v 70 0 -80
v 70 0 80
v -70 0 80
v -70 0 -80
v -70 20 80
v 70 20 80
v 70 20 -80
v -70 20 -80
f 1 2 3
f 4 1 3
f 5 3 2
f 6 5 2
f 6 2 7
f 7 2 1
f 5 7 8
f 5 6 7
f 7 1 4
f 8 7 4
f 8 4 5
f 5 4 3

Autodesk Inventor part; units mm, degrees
ref_plane "YZ Plane" through (0, 0, 0) normal (1, 0, 0) x (0, 1, 0)
ref_plane "XZ Plane" through (0, 0, 0) normal (0, 1, 0) x (-1, 0, 0)
ref_plane "XY Plane" through (0, 0, 0) normal (0, 0, 1) x (1, 0, 0)
sketch "Sketch1" plane through (0, 0, 0) normal (0, 1, 0) x (-1, 0, 0)
  line L0 (70, 80) -> (-70, 80)
  line L1 (-70, 80) -> (-70, -80)
  line L2 (-70, -80) -> (70, -80)
  line L3 (70, -80) -> (70, 80)
  point P0 (0, 0)
  dimension "d13" = 20
  dimension "d0" = 140
  dimension "d1" = 160
  dimension "d4" = 70
  dimension "d5" = 80
extrude "Extrusion1" add sketch "Sketch1" along normal blind 20
sketch "Sketch2" plane through (0, 20, 0) normal (0, 1, 0) x (1, 0, 0)
  line L0 (50, 60) -> (-50, 60)
  line L1 (-50, 60) -> (-50, -60)
  line L2 (-50, -60) -> (50, -60)
  line L3 (50, -60) -> (50, 60)
  line L4 (50, 60) -> (-50, -60) construction
  line L5 (-50, 60) -> (50, -60) construction
  point P0 (0, 0)
  dimension "d8" = 100
  dimension "d9" = 120
extrude "Extrusion2" add sketch "Sketch2" along normal blind 10
sketch "Sketch3" plane through (0, 30, 0) normal (0, 1, 0) x (1, 0, 0)
  line L0 (-50, 60) -> (-50, -60) projected
  line L1 (-50, -60) -> (-30, -60)
  line L2 (-30, -60) -> (-30, -40)
  line L3 (-30, -40) -> (-50, -40)
  line L4 (-50, -40) -> (-50, -60)
  line L5 (-10, -60) -> (10, -60)
  line L6 (10, -60) -> (10, -40)
  line L7 (10, -40) -> (-10, -40)
  line L8 (-10, -40) -> (-10, -60)
  line L9 (10, -40) -> (30, -40)
  line L10 (30, -40) -> (30, -20)
  line L11 (30, -20) -> (10, -20)
  line L12 (10, -20) -> (10, -40)
  line L13 (-30, -40) -> (-10, -40)
  line L14 (-10, -40) -> (-10, -20)
  line L15 (-10, -20) -> (-30, -20)
  line L16 (-30, -20) -> (-30, -40)
  line L17 (-50, -60) -> (50, -60) projected
  line L18 (-53.5785, -189.3047) -> (-33.5785, -189.3047)
  line L19 (-33.5785, -189.3047) -> (-33.5785, -169.3047)
  line L20 (-33.5785, -169.3047) -> (-53.5785, -169.3047)
  line L21 (-53.5785, -169.3047) -> (-53.5785, -189.3047)
  line L22 (-50, -20) -> (-30, -20)
  line L23 (-30, -20) -> (-30, 0)
  line L24 (-30, 0) -> (-50, 0)
  line L25 (-50, 0) -> (-50, -20)
  line L26 (-10, -20) -> (10, -20)
  line L27 (10, -20) -> (10, 0)
  line L28 (10, 0) -> (-10, 0)
  line L29 (-10, 0) -> (-10, -20)
  line L30 (10, 40) -> (30, 40)
  line L31 (30, 40) -> (30, 60)
  line L32 (30, 60) -> (10, 60)
  line L33 (10, 60) -> (10, 40)
  line L34 (-10, 20) -> (-30, 20)
  line L35 (-30, 0) -> (-10, 0)
  line L36 (-30, 20) -> (-30, 0)
  line L37 (-10, 0) -> (-10, 20)
  line L38 (10, 40) -> (-10, 40)
  line L39 (-10, 20) -> (10, 20)
  line L40 (-10, 40) -> (-10, 20)
  line L41 (10, 20) -> (10, 40)
  line L42 (30, 20) -> (10, 20)
  line L43 (10, 0) -> (30, 0)
  line L44 (10, 20) -> (10, 0)
  line L45 (30, 0) -> (30, 20)
  line L46 (-10, 60) -> (-30, 60)
  line L47 (-30, 40) -> (-10, 40)
  line L48 (-30, 60) -> (-30, 40)
  line L49 (-10, 40) -> (-10, 60)
  line L50 (-30, 40) -> (-50, 40)
  line L51 (-50, 20) -> (-30, 20)
  line L52 (-50, 40) -> (-50, 20)
  line L53 (-30, 20) -> (-30, 40)
  line L54 (30, 20) -> (50, 20)
  line L55 (50, 20) -> (50, 40)
  line L56 (50, 40) -> (30, 40)
  line L57 (30, 40) -> (30, 20)
  line L58 (30, -20) -> (50, -20)
  line L59 (50, -20) -> (50, 0)
  line L60 (50, 0) -> (30, 0)
  line L61 (30, 0) -> (30, -20)
  line L62 (30, -60) -> (50, -60)
  line L63 (50, -60) -> (50, -40)
  line L64 (50, -40) -> (30, -40)
  line L65 (30, -40) -> (30, -60)
  dimension "d12" = 20
  dimension "d13" = 20
  dimension "d14" = 20
  dimension "d15" = 20
  dimension "d17" = 20
  dimension "d18" = 20
  dimension "d19" = 20
  dimension "d21" = 20
  dimension "d22" = 20
  dimension "d25" = 20
  dimension "d26" = 20
  dimension "d27" = 20
  dimension "d28" = 20
  dimension "d30" = 20
  dimension "d31" = 20
  dimension "d33" = 20
  dimension "d34" = 20
  dimension "d36" = 20
  dimension "d37" = 20
  dimension "d39" = 20
  dimension "d40" = 20
  dimension "d42" = 20
  dimension "d43" = 20
  dimension "d45" = 20
  dimension "d46" = 20
  dimension "d48" = 20
  dimension "d49" = 20
  dimension "d77" = 20
  dimension "d78" = 20
  dimension "d80" = 20
  dimension "d81" = 20
  dimension "d83" = 20
  dimension "d84" = 20
extrude "Extrusion5" cut sketch "Sketch3" against normal blind 10 contours L50 L53 L51 L0 | L48 L46 L49 L47 | L24 L23 L22 L0 | L34 L37 L35 L36 | L38 L41 L39 L40 | L33 L32 L31 L30 | L3 L2 L1 L0 | L15 L14 L13 L16 | L28 L27 L26 L29 | L42 L45 L43 L44 | L56 L55 L54 L57 | L7 L6 L5 L8 | L11 L10 L9 L12 | L60 L59 L58 L61 | L64 L63 L17 L65
sketch "Sketch4" plane through (0, 20, 0) normal (0, 1, 0) x (1, 0, 0)
  line L0 (-65, -75) -> (-65, 45)
  line L1 (-65, 45) -> (-60, 45)
  line L2 (-60, 45) -> (-60, -70)
  line L3 (-60, -70) -> (25, -70)
  line L4 (25, -70) -> (25, -75)
  line L5 (25, -75) -> (-65, -75)
  line L6 (-70, -80) -> (70, -80) projected
  line L7 (-70, 80) -> (-70, -80) projected
  line L8 (-53.0136, 61.5997) -> (-53.0136, 50) construction
  line L9 (-53.0136, 50) -> (-65.2641, 50) construction
  line L10 (-65.2641, 50) -> (-65.2641, 61.5997) construction
  line L11 (-65.2641, 61.5997) -> (-53.0136, 61.5997) construction
  line L12 (30, -75) -> (30, -63.5159) construction
  line L13 (30, -63.5159) -> (34.1954, -63.5159) construction
  line L14 (34.1954, -63.5159) -> (34.1954, -75) construction
  line L15 (34.1954, -75) -> (30, -75) construction
  line L16 (-65.0136, 50.2026) -> (-65.0136, 53.684)
  line L17 (-65.0136, 53.684) -> (-61.1919, 55.9984)
  line L18 (-61.1919, 55.9984) -> (-65.0136, 58.3615)
  line L19 (-65.0136, 58.3615) -> (-65.0136, 61.697)
  line L20 (-65.0136, 61.697) -> (-58.9747, 57.7975)
  line L21 (-58.9747, 57.7975) -> (-53.0136, 61.5414)
  line L22 (-53.0136, 61.5414) -> (-53.0136, 58.06)
  line L23 (-53.0136, 58.06) -> (-56.6408, 55.8915)
  line L24 (-56.6408, 55.8915) -> (-53.0136, 53.6646)
  line L25 (-53.0136, 53.6646) -> (-53.0136, 50.3291)
  line L26 (-53.0136, 50.3291) -> (-58.8483, 54.0924)
  line L27 (-58.8483, 54.0924) -> (-65.0136, 50.2026)
  line L28 (30, -63.778) -> (36.9919, -67.9206)
  line L29 (36.9919, -67.9206) -> (42, -67.9206)
  line L30 (42, -67.9206) -> (42, -70.9352)
  line L31 (42, -70.9352) -> (37.1378, -70.9352)
  line L32 (37.1378, -70.9352) -> (30, -75.1459)
  line L33 (30, -75.1459) -> (30, -71.7131)
  line L34 (30, -71.7131) -> (34.2788, -69.3695)
  line L35 (34.2788, -69.3695) -> (30, -67.1037)
  line L36 (30, -67.1037) -> (30, -63.778)
  point P0 (0, 0)
  point P1 (-62.5, 45)
  point P2 (-58.8748, 54.3197)
  point P3 (25, -72.5)
  point P4 (28.8521, -69.3123)
  point P5 (28.8521, -69.3123)
  dimension "d53" = 5
  dimension "d54" = 5
  dimension "d55" = 5
  dimension "d56" = 5
  dimension "d57" = 120
  dimension "d58" = 90
  dimension "d63" = 12.2505
  dimension "d73" = 5
  dimension "d88" = 5
  dimension "d90" = 5
extrude "Extrusion4" add sketch "Sketch4" along normal blind 10
sketch "Sketch5" plane through (0, 20, 0) normal (0, 1, 0) x (1, 0, 0)
  line L0 (66.7816, 77.1138) -> (-66.7816, 77.1138)
  line L1 (-66.7816, 77.1138) -> (-66.7816, -77.1138)
  line L2 (-66.7816, -77.1138) -> (66.7816, -77.1138)
  line L3 (66.7816, -77.1138) -> (66.7816, 77.1138)
  line L4 (66.7816, 77.1138) -> (-66.7816, -77.1138) construction
  line L5 (-66.7816, 77.1138) -> (66.7816, -77.1138) construction
  point P0 (0, 0)
extrude "Extrusion6" cut sketch "Sketch5" along normal blind 10
equation "\"d13\" = cell"
equation "\"d4\" = 0.5 * d0"
equation "\"d5\" = 0.5 * d1"
equation "\"d12\" = cell"
equation "\"d14\" = d16"
equation "\"d15\" = d16"
equation "\"d17\" = cell"
equation "\"d18\" = d20"
equation "\"d19\" = d20"
equation "\"d21\" = d23"
equation "\"d22\" = d23"
equation "\"d25\" = cell"
equation "\"d26\" = cell"
equation "\"d27\" = d29"
equation "\"d28\" = d29"
equation "\"d30\" = d32"
equation "\"d31\" = d32"
equation "\"d33\" = d35"
equation "\"d34\" = d35"
equation "\"d36\" = d38"
equation "\"d37\" = d38"
equation "\"d39\" = d41"
equation "\"d40\" = d41"
equation "\"d42\" = d44"
equation "\"d43\" = d44"
equation "\"d45\" = d47"
equation "\"d46\" = d47"
equation "\"d48\" = d50"
equation "\"d49\" = d50"
equation "\"cell\" = 20"
equation "\"d16\" = 20"
equation "\"d20\" = 20"
equation "\"d23\" = 20"
equation "\"d29\" = 20"
equation "\"d32\" = 20"
equation "\"d35\" = 20"
equation "\"d38\" = 20"
equation "\"d41\" = 20"
equation "\"d44\" = 20"
equation "\"d47\" = 20"
equation "\"d50\" = 20"
properties part number "3D_Grid_base" material "Acetal Resin, White"
